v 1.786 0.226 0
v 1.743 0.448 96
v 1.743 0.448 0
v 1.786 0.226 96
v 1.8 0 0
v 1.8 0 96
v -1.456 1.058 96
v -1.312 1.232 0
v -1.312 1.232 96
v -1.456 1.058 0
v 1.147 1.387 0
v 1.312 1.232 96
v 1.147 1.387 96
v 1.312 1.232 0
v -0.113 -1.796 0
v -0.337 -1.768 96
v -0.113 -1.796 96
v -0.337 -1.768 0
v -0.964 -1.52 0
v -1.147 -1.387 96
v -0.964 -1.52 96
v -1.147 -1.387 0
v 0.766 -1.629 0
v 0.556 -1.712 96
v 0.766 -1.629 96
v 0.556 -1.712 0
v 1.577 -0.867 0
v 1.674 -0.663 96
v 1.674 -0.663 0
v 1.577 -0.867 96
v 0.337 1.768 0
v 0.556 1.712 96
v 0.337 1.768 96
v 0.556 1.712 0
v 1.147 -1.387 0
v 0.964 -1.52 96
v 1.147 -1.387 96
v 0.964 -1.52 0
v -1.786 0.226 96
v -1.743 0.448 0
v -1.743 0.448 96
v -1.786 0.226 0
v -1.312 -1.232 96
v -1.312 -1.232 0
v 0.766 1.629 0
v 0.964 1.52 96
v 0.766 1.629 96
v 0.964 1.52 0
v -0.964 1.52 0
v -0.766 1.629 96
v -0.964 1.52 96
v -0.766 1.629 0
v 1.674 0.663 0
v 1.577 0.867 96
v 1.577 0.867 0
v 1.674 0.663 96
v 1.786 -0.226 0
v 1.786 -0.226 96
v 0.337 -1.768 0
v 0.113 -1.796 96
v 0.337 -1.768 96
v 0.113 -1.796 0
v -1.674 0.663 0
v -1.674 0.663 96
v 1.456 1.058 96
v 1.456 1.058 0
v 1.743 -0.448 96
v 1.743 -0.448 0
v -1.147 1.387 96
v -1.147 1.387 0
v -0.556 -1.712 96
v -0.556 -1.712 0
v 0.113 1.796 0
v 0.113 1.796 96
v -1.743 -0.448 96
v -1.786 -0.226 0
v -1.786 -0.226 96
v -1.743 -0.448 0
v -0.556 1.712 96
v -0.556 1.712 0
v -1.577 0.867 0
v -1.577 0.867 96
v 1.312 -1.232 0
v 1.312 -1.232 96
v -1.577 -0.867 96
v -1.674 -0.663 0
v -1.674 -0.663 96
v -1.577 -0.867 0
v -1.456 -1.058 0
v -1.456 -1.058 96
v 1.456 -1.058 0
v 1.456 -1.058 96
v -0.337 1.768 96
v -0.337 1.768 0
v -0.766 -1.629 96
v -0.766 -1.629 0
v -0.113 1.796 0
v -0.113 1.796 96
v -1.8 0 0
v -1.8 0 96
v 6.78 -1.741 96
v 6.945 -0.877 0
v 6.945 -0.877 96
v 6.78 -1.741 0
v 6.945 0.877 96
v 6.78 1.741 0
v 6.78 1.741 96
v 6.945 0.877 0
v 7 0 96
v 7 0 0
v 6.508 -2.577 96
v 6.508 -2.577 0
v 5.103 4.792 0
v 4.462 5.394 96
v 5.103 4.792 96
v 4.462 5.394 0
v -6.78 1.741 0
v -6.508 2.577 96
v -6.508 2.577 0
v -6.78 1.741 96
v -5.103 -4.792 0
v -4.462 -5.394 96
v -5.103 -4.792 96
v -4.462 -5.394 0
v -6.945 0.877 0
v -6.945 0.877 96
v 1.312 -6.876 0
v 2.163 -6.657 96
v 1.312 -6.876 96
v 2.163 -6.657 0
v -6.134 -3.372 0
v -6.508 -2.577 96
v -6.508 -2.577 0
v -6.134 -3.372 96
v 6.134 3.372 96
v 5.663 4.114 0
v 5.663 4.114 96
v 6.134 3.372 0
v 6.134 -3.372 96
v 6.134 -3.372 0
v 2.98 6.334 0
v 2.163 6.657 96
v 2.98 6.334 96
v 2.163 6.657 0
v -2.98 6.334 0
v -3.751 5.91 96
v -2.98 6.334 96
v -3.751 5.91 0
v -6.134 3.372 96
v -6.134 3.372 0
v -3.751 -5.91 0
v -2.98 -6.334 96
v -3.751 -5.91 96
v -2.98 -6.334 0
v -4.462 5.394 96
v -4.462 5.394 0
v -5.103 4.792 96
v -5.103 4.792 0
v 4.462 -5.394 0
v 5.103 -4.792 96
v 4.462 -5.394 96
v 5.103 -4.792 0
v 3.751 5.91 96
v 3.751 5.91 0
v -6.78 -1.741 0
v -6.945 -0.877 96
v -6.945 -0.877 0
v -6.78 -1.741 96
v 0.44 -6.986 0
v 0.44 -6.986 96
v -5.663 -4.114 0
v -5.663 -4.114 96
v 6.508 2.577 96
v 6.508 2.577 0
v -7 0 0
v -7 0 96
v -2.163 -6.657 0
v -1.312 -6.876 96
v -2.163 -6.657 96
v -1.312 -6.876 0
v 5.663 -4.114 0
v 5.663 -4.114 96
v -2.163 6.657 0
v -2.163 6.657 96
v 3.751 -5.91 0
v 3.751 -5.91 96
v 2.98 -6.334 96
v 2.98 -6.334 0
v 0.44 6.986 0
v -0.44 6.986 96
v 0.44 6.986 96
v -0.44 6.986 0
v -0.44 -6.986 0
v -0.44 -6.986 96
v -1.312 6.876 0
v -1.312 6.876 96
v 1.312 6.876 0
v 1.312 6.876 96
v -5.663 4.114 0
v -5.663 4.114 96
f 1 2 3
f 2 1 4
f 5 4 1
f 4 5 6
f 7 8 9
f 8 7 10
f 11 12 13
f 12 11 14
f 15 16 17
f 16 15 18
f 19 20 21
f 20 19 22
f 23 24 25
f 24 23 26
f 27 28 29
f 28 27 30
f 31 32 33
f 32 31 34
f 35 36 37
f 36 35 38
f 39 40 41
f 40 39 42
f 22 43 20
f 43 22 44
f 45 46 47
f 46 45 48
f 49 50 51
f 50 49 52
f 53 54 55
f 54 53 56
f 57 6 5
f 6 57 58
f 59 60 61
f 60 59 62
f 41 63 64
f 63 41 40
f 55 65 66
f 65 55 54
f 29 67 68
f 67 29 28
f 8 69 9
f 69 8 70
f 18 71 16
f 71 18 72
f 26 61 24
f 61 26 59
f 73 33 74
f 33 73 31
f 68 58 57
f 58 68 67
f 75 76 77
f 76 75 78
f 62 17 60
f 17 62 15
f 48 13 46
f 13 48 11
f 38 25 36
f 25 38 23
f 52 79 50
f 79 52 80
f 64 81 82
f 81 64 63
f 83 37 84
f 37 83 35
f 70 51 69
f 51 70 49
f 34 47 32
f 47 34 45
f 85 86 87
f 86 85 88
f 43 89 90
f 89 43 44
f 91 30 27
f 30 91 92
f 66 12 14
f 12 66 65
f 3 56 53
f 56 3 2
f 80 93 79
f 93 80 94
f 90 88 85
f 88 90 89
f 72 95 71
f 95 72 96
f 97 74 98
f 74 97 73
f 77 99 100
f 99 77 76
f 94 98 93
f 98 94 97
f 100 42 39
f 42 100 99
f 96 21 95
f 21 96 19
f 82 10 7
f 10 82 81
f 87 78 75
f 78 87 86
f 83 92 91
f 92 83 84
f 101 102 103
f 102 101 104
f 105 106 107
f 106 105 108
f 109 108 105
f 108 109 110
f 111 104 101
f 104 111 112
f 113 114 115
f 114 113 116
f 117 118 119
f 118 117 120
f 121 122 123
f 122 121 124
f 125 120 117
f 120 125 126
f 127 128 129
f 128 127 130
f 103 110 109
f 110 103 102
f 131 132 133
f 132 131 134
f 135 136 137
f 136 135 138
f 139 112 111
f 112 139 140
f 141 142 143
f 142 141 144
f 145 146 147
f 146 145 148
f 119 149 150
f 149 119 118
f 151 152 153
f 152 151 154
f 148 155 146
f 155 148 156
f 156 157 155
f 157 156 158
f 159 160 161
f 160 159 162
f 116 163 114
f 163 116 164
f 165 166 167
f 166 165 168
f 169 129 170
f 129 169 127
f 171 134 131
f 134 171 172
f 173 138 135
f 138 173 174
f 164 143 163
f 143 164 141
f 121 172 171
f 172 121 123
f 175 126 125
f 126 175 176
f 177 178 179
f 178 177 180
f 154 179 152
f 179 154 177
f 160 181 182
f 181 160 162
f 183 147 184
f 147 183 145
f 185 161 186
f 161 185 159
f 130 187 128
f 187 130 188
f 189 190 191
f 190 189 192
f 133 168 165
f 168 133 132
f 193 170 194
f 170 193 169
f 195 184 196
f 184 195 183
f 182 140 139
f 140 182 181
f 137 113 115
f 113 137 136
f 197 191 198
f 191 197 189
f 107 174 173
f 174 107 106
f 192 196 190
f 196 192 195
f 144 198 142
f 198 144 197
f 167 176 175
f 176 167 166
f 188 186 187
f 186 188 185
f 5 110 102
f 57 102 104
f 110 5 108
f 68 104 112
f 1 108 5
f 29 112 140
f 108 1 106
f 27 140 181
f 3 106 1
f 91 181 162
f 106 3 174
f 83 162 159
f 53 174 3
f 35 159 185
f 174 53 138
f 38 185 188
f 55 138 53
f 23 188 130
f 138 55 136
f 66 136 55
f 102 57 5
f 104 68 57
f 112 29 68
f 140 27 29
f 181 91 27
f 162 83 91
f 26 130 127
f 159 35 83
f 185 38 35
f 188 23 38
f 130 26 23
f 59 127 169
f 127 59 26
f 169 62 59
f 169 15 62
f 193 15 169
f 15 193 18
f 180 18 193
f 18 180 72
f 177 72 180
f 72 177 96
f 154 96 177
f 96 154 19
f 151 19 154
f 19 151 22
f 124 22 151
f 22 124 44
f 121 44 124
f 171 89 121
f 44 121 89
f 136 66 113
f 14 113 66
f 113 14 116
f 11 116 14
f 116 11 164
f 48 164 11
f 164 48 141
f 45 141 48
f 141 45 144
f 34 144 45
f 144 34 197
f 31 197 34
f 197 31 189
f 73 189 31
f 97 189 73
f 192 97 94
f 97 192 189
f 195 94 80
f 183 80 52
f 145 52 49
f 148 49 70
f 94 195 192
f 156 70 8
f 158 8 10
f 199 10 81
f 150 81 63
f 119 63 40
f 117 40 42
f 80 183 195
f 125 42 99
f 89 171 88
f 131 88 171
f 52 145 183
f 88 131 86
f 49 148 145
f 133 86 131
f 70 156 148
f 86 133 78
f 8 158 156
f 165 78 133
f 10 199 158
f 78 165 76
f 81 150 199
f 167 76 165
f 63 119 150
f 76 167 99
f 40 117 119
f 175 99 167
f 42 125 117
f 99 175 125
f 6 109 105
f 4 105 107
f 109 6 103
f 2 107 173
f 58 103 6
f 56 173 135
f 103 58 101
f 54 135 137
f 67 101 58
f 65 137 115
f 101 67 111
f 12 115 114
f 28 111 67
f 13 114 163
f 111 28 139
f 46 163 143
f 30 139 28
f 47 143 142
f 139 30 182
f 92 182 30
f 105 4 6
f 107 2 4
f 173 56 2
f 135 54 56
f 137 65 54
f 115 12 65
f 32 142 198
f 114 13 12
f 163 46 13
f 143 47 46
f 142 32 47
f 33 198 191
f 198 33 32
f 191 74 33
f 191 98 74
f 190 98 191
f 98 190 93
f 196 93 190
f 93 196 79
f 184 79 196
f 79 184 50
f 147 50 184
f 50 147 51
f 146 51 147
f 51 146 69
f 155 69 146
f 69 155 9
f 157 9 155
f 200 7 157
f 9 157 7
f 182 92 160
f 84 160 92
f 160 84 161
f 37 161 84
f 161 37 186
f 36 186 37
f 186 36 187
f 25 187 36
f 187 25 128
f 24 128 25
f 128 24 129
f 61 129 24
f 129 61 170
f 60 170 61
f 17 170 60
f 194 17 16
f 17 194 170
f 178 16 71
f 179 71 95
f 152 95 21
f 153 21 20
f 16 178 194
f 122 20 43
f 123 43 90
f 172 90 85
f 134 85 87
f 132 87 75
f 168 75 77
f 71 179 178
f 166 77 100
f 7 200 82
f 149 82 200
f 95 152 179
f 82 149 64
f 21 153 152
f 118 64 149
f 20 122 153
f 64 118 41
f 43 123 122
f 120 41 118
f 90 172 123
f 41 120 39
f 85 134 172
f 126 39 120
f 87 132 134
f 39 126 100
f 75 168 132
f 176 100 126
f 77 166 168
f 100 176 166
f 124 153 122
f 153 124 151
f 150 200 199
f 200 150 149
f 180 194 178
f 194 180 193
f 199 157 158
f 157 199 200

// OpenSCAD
$fn = 50;


difference() {
	union() {
		cylinder(h = 96, r = 7.0000000000);
	}
	union() {
		translate(v = [0.0000000000, 0.0000000000, -100.0000000000]) {
			cylinder(h = 200, r = 1.8000000000);
		}
		cylinder(h = 96, r = 1.8000000000);
		cylinder(h = 96, r = 1.8000000000);
		cylinder(h = 96, r = 1.8000000000);
	}
}
